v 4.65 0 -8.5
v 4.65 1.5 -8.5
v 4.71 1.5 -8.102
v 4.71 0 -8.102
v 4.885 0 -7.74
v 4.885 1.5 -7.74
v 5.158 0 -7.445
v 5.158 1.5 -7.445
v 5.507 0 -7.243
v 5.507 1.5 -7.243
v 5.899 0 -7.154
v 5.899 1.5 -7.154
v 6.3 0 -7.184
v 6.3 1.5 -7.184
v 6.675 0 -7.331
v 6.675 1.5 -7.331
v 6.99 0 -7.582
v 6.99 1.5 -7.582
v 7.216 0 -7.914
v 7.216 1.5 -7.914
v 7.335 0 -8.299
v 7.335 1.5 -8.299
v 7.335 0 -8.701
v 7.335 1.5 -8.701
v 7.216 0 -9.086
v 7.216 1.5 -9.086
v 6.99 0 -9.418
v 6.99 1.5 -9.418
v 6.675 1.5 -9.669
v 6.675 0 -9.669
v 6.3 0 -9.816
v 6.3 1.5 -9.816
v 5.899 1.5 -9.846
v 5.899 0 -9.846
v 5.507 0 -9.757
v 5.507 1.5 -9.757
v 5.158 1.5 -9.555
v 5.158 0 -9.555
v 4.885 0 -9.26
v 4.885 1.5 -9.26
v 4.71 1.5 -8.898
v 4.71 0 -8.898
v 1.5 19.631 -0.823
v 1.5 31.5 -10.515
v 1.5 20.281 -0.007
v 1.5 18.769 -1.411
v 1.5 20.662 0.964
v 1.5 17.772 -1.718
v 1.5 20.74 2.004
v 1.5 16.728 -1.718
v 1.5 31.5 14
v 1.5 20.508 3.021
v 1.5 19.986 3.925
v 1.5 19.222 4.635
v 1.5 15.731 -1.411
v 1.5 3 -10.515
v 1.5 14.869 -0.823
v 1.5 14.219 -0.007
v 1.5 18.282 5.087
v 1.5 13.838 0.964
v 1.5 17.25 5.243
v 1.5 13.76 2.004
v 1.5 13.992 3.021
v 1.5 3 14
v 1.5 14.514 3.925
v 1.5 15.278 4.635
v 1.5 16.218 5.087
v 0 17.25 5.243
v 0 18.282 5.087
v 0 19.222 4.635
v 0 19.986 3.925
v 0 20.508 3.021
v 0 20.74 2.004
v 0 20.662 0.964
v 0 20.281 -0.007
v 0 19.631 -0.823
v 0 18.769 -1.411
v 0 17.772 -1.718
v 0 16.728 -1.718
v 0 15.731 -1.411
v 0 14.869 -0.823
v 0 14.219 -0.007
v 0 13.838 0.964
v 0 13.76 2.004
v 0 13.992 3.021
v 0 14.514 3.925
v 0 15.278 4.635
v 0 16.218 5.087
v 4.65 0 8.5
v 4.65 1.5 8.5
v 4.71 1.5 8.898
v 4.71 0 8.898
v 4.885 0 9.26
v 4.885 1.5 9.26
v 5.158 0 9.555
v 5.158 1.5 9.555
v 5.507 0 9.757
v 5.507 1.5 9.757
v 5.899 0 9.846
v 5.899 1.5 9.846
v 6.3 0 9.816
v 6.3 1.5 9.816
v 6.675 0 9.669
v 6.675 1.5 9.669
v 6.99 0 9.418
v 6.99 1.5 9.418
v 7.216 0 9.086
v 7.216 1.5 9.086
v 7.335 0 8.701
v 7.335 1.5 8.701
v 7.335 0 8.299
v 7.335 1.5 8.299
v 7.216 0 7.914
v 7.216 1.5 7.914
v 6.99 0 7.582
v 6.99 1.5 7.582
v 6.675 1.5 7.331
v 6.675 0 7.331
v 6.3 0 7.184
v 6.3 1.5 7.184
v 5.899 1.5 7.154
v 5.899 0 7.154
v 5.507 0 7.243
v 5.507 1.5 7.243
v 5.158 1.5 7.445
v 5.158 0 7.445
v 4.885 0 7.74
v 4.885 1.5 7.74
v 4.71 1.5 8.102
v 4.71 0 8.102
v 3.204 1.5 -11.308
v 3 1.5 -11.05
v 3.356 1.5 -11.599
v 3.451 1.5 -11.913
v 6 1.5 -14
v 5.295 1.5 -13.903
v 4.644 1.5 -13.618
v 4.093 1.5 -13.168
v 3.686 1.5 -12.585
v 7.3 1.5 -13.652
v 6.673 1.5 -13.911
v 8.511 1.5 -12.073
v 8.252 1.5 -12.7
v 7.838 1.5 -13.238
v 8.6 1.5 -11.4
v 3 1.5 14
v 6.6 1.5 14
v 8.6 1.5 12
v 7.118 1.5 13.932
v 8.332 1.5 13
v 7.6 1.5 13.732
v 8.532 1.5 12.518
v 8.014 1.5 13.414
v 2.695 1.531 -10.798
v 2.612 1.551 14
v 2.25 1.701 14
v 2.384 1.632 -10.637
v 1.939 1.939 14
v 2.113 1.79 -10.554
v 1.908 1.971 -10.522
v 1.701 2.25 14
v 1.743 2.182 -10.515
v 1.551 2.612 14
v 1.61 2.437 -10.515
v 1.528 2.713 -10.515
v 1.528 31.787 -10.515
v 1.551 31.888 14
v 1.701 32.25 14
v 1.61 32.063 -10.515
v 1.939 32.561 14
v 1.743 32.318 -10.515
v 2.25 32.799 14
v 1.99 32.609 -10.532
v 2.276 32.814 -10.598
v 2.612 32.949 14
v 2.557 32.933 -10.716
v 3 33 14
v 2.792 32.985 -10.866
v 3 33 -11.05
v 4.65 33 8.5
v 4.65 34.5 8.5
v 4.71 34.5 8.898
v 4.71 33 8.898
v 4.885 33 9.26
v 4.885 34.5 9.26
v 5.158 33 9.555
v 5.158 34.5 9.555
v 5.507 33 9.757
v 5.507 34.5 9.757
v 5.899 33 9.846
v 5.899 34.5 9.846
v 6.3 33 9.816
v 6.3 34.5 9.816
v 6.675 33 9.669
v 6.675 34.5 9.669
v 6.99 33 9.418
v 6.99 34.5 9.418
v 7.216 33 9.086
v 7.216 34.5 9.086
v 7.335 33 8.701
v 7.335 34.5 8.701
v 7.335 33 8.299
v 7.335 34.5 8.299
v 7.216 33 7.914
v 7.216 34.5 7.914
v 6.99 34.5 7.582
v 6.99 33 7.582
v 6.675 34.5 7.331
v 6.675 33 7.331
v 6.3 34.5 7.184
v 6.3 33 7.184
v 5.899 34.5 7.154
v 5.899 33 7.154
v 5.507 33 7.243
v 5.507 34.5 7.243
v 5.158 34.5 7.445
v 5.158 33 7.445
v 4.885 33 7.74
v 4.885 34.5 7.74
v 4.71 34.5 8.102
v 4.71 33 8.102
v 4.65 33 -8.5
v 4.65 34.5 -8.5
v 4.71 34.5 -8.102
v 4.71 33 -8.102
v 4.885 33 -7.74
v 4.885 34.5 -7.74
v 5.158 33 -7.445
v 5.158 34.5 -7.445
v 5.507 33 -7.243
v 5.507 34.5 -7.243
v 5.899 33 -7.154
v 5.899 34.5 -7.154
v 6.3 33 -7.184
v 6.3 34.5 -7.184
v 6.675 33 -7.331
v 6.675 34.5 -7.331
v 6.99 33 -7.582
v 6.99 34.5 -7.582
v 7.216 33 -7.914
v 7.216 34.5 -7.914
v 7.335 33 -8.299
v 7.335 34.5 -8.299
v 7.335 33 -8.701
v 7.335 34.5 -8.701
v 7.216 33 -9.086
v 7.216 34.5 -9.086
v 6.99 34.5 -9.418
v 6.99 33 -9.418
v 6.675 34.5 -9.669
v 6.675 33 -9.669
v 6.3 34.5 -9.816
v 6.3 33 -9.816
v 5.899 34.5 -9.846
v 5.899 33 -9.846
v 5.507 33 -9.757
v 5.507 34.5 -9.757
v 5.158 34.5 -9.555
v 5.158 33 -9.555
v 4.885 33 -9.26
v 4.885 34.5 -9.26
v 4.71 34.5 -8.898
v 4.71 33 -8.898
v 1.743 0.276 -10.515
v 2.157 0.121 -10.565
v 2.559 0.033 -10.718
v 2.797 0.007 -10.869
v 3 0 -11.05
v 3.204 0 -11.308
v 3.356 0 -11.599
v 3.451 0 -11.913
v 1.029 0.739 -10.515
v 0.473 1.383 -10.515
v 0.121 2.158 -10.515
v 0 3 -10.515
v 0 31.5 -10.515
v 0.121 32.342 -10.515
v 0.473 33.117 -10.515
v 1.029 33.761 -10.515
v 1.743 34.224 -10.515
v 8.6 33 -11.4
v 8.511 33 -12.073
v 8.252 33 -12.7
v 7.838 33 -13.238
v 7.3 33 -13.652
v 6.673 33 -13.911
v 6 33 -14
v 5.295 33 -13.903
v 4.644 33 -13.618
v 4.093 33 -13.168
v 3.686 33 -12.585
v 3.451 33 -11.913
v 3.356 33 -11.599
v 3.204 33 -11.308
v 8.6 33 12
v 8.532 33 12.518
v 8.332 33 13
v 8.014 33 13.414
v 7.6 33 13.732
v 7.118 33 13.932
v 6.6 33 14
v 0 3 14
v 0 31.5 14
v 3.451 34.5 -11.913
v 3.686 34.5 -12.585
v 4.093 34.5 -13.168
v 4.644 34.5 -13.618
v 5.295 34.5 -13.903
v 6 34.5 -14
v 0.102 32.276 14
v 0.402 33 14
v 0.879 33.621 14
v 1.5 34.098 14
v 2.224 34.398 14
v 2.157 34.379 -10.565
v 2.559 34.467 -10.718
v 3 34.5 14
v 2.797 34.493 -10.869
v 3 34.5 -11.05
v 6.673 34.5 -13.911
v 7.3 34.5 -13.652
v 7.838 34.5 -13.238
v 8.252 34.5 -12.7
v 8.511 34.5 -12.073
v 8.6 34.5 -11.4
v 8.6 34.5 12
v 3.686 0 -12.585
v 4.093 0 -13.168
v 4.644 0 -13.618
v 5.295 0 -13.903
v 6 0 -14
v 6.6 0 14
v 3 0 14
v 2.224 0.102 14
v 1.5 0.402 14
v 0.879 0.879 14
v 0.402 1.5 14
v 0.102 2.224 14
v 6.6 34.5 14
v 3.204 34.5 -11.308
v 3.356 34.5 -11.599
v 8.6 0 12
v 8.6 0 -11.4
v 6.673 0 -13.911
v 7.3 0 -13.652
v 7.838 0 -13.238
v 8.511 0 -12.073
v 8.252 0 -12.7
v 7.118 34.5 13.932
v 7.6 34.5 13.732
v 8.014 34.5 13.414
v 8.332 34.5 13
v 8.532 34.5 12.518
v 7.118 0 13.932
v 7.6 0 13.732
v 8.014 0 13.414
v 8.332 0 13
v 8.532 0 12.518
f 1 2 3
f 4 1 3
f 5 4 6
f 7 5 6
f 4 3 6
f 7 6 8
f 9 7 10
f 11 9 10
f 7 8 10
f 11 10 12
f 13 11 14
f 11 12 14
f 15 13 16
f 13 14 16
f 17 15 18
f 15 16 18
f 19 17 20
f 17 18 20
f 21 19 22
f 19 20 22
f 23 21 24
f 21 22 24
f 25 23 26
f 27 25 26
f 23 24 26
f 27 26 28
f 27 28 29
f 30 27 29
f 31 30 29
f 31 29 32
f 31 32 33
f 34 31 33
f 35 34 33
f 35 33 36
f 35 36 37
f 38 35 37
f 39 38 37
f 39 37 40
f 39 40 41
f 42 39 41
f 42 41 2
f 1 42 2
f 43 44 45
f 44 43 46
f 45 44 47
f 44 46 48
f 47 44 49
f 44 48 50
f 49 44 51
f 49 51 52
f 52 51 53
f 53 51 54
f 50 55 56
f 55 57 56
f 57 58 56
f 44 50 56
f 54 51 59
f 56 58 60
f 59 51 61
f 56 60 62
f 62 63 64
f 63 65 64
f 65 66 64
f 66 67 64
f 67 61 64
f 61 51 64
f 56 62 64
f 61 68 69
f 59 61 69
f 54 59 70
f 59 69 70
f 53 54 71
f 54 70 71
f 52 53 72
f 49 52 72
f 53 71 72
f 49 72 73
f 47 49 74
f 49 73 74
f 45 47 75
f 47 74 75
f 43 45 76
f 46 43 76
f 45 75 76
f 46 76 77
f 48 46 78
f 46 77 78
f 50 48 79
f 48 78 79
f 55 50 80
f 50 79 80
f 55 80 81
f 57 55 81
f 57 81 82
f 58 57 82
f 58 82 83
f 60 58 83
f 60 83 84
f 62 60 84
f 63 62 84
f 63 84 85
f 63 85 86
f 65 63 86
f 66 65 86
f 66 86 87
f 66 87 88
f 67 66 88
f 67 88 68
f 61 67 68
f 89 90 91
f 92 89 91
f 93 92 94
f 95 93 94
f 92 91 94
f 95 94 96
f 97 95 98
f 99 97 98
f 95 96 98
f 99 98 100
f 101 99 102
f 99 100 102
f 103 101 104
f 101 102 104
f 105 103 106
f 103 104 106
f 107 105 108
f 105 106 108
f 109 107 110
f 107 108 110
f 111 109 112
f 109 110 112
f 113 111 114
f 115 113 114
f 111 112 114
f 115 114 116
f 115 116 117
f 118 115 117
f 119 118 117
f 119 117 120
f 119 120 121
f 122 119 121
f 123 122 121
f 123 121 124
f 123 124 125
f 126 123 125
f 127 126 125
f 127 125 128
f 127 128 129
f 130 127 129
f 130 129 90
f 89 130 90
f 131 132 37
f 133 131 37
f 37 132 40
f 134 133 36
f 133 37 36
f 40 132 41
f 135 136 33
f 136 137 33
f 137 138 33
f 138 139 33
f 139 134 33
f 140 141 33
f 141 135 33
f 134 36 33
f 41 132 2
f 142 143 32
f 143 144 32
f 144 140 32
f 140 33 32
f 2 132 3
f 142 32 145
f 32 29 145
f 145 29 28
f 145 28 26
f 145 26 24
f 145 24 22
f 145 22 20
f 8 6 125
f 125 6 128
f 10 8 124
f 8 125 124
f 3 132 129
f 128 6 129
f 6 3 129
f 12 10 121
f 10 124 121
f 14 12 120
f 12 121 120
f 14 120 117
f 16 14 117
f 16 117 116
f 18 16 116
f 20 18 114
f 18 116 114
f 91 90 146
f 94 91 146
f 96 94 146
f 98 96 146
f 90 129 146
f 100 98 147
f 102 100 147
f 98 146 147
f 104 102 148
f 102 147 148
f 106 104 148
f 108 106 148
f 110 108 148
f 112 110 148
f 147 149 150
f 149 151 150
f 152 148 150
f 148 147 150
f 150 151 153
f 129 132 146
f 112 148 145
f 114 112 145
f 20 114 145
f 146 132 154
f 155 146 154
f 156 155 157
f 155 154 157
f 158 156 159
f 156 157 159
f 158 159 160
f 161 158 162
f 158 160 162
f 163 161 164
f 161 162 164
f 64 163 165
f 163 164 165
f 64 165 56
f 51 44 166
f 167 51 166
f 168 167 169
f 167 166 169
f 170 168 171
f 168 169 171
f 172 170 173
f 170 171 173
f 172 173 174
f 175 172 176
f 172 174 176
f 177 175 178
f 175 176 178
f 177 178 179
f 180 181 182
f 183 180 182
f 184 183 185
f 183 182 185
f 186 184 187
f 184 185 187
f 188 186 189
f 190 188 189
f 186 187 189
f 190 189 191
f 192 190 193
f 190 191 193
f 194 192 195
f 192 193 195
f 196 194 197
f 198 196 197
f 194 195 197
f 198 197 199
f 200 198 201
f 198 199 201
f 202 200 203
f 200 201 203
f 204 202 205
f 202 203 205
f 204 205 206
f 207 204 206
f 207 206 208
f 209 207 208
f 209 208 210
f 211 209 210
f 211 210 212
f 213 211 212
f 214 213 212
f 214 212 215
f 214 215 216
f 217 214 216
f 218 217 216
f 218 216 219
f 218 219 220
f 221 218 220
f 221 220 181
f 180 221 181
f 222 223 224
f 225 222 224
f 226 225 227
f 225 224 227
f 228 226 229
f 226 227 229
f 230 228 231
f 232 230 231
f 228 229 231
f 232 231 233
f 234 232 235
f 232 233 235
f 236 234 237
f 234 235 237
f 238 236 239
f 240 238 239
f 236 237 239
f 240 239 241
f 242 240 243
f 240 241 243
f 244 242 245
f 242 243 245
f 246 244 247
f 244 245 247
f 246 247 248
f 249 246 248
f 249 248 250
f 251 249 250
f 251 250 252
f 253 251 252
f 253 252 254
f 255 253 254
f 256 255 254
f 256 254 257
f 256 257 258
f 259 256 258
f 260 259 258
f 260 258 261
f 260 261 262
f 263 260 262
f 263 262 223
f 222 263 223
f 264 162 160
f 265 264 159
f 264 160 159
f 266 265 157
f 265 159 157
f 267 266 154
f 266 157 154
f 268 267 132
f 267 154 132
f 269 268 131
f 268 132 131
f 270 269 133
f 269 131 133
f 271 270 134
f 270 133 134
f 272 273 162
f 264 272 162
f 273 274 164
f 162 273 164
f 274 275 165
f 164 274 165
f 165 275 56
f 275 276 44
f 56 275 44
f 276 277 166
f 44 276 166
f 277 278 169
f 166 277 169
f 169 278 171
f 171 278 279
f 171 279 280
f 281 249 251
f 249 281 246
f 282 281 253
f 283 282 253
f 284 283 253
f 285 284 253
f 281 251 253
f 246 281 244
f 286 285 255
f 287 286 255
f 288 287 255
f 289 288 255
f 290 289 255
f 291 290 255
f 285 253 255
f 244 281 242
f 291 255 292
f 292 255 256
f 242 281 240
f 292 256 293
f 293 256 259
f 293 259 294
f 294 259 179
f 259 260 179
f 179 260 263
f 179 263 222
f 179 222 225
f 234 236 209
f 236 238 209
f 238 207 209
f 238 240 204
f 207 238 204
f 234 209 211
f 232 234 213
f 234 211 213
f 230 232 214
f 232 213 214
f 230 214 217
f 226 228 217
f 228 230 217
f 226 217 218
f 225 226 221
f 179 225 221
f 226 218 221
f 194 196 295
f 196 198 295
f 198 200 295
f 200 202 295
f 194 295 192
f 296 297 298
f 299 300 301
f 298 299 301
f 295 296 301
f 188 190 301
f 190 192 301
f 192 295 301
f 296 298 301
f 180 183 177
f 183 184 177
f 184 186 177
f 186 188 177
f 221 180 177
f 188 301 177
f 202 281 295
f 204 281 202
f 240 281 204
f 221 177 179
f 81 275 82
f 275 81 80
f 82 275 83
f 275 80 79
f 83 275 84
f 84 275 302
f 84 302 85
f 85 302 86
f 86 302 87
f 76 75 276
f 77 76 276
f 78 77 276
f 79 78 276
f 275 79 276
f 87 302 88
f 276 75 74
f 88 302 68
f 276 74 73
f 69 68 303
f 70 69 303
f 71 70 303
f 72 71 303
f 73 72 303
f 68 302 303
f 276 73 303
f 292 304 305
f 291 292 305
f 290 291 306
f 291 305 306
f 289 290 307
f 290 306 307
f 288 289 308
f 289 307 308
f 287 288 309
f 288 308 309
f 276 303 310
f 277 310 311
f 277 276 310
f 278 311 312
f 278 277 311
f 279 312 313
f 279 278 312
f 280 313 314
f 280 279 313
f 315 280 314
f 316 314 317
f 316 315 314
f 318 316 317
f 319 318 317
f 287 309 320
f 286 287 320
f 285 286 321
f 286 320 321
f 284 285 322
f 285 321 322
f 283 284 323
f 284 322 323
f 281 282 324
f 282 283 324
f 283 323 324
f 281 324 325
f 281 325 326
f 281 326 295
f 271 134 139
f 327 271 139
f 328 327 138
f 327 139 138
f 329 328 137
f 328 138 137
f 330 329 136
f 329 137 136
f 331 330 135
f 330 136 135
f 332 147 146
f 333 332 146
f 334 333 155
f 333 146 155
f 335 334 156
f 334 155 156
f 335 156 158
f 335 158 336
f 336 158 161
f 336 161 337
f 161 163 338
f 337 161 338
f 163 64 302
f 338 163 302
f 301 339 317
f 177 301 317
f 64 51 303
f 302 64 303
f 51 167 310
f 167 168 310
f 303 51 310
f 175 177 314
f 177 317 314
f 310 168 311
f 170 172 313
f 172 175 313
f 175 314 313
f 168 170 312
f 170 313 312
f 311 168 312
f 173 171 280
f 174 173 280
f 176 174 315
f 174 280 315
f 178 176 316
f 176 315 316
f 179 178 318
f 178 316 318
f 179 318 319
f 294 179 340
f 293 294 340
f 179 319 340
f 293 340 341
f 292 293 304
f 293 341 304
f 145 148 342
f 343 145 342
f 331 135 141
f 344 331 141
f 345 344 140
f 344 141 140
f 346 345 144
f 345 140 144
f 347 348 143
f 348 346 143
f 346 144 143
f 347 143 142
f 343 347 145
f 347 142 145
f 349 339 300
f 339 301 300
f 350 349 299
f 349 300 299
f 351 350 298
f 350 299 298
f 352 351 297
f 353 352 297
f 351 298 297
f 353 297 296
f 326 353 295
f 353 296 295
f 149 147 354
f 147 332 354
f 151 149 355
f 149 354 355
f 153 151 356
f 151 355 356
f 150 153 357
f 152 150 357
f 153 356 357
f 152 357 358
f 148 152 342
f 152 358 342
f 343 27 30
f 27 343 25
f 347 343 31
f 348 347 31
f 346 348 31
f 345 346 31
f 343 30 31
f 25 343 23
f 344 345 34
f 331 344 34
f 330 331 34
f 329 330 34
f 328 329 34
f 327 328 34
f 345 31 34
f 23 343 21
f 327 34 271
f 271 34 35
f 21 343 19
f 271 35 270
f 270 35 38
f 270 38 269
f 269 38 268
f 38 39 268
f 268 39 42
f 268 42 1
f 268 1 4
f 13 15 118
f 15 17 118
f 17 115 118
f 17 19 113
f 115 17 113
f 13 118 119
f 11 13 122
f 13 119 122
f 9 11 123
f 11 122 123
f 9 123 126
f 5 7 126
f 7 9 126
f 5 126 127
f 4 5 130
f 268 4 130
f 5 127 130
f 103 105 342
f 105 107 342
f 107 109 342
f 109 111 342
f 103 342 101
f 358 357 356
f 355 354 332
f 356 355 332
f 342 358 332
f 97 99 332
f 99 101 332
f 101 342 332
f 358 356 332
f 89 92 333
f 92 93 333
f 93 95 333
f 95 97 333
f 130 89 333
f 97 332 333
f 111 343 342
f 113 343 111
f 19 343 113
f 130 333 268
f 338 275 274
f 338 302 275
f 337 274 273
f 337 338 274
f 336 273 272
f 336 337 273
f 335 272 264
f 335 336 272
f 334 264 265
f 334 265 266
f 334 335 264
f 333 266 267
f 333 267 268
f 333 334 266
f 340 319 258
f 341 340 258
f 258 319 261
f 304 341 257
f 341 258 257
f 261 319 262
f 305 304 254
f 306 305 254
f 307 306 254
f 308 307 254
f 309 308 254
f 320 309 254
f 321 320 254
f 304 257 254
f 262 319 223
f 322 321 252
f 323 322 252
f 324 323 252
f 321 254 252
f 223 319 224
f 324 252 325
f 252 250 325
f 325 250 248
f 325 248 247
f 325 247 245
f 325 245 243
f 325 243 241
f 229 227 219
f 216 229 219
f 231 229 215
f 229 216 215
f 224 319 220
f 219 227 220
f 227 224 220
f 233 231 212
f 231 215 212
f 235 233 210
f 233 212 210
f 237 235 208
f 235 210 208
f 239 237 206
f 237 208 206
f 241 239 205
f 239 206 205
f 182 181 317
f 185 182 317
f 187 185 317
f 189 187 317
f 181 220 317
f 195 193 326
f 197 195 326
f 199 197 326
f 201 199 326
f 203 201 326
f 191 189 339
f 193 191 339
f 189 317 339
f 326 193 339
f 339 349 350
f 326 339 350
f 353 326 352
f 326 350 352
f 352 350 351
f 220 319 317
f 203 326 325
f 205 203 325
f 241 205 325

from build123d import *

# Parameters (mm, degrees)
BOSS_EXTRUDE1_DEPTH = 14
SKETCH2_R           = 1.35
CUT_EXTRUDE1_DEPTH  = 39.212694226
SKETCH4_R           = 1.742727666
CUT_EXTRUDE3_DEPTH  = 39.212694226
SKETCH3_R           = 3.5
CUT_EXTRUDE2_DEPTH  = 39.212694226
FILLET1_R           = 3
FILLET2_R           = 2
FILLET3_R           = 1.5


with BuildPart() as part:
    # Sketch1 → Boss-Extrude1 (new, symmetric)
    with BuildSketch(Plane.XY):
        Polygon((0, 0), (0, 34.5), (8.6, 34.5), (8.6, 33), (1.5, 33), (1.5, 1.5), (8.6, 1.5), (8.6, 0), align=None)
    extrude(amount=BOSS_EXTRUDE1_DEPTH, both=True)

    # Sketch2 → Cut-Extrude1 (cut, through all)
    with BuildSketch(Plane(origin=(0, 34.5, 0), x_dir=(1, 0, 0), z_dir=(0, 1, 0))):
        with Locations(Location((6, 8.5, 0), (0, 0, 180))):
            Circle(SKETCH2_R)
        with Locations(Location((6, -8.5, 0), (0, 0, 180))):
            Circle(SKETCH2_R)
    extrude(amount=-CUT_EXTRUDE1_DEPTH, mode=Mode.SUBTRACT)

    # Sketch4 → Cut-Extrude3 (cut, through all)
    with BuildSketch(Plane(origin=(0, 34.5, 0), x_dir=(1, 0, 0), z_dir=(0, 1, 0))):
        with BuildLine():
            Line((8.6, 14), (6, 14))
            ThreePointArc((6, 14), (7.838477631, 13.238477631), (8.6, 11.4))
            Line((8.6, 11.4), (8.6, 14))
        make_face()
        Polygon((0, 14.708926335), (0, 14), (1.742727666, 14), (6, 14), (8.6, 14), (8.6, 11.4), (10.428656455, 11.4), (10.428656455, 14.708926335), align=None)
        with BuildLine():
            ThreePointArc((3.485455332, 12.257272334), (3.47686088, 12.084409052), (3.451162292, 11.913250757))
            ThreePointArc((3.451162292, 11.913250757), (4.352949905, 13.411771852), (6, 14))
            Line((6, 14), (1.742727666, 14))
            ThreePointArc((1.742727666, 14), (2.975022216, 13.489566884), (3.485455332, 12.257272334))
        make_face()
        with Locations((1.742727666, 12.257272334)):
            Circle(SKETCH4_R)
        with BuildLine():
            Line((0, 14), (0, 12.257272334))
            ThreePointArc((0, 12.257272334), (0.510433116, 13.489566884), (1.742727666, 14))
            Line((1.742727666, 14), (0, 14))
        make_face()
        with BuildLine():
            Line((0, 10.514544668), (1.742727666, 10.514544668))
            ThreePointArc((1.742727666, 10.514544668), (0.510433116, 11.024977784), (0, 12.257272334))
            Line((0, 12.257272334), (0, 10.514544668))
        make_face()
    extrude(amount=-CUT_EXTRUDE3_DEPTH, mode=Mode.SUBTRACT)

    # Sketch3 → Cut-Extrude2 (cut, through all)
    with BuildSketch(Plane.ZY):
        with Locations((1.742727666, 17.25)):
            Circle(SKETCH3_R)
    extrude(amount=-CUT_EXTRUDE2_DEPTH, mode=Mode.SUBTRACT)

    # Fillet1
    fillet1_edges = [part.edges().sort_by_distance(p)[0] for p in [
        (0, 0, 1.742727666),
        (0, 34.5, 1.742727666),
    ]]
    fillet(fillet1_edges, radius=FILLET1_R)

    # Fillet2
    fillet2_edges = [part.edges().sort_by_distance(p)[0] for p in [
        (8.6, 33.75, 14),
        (8.6, 0.75, 14),
    ]]
    fillet(fillet2_edges, radius=FILLET2_R)

    # Fillet3
    fillet3_edges = [part.edges().sort_by_distance(p)[0] for p in [
        (1.5, 1.5, 1.742727666),
        (1.5, 33, 1.742727666),
    ]]
    fillet(fillet3_edges, radius=FILLET3_R)


solid = part.part
